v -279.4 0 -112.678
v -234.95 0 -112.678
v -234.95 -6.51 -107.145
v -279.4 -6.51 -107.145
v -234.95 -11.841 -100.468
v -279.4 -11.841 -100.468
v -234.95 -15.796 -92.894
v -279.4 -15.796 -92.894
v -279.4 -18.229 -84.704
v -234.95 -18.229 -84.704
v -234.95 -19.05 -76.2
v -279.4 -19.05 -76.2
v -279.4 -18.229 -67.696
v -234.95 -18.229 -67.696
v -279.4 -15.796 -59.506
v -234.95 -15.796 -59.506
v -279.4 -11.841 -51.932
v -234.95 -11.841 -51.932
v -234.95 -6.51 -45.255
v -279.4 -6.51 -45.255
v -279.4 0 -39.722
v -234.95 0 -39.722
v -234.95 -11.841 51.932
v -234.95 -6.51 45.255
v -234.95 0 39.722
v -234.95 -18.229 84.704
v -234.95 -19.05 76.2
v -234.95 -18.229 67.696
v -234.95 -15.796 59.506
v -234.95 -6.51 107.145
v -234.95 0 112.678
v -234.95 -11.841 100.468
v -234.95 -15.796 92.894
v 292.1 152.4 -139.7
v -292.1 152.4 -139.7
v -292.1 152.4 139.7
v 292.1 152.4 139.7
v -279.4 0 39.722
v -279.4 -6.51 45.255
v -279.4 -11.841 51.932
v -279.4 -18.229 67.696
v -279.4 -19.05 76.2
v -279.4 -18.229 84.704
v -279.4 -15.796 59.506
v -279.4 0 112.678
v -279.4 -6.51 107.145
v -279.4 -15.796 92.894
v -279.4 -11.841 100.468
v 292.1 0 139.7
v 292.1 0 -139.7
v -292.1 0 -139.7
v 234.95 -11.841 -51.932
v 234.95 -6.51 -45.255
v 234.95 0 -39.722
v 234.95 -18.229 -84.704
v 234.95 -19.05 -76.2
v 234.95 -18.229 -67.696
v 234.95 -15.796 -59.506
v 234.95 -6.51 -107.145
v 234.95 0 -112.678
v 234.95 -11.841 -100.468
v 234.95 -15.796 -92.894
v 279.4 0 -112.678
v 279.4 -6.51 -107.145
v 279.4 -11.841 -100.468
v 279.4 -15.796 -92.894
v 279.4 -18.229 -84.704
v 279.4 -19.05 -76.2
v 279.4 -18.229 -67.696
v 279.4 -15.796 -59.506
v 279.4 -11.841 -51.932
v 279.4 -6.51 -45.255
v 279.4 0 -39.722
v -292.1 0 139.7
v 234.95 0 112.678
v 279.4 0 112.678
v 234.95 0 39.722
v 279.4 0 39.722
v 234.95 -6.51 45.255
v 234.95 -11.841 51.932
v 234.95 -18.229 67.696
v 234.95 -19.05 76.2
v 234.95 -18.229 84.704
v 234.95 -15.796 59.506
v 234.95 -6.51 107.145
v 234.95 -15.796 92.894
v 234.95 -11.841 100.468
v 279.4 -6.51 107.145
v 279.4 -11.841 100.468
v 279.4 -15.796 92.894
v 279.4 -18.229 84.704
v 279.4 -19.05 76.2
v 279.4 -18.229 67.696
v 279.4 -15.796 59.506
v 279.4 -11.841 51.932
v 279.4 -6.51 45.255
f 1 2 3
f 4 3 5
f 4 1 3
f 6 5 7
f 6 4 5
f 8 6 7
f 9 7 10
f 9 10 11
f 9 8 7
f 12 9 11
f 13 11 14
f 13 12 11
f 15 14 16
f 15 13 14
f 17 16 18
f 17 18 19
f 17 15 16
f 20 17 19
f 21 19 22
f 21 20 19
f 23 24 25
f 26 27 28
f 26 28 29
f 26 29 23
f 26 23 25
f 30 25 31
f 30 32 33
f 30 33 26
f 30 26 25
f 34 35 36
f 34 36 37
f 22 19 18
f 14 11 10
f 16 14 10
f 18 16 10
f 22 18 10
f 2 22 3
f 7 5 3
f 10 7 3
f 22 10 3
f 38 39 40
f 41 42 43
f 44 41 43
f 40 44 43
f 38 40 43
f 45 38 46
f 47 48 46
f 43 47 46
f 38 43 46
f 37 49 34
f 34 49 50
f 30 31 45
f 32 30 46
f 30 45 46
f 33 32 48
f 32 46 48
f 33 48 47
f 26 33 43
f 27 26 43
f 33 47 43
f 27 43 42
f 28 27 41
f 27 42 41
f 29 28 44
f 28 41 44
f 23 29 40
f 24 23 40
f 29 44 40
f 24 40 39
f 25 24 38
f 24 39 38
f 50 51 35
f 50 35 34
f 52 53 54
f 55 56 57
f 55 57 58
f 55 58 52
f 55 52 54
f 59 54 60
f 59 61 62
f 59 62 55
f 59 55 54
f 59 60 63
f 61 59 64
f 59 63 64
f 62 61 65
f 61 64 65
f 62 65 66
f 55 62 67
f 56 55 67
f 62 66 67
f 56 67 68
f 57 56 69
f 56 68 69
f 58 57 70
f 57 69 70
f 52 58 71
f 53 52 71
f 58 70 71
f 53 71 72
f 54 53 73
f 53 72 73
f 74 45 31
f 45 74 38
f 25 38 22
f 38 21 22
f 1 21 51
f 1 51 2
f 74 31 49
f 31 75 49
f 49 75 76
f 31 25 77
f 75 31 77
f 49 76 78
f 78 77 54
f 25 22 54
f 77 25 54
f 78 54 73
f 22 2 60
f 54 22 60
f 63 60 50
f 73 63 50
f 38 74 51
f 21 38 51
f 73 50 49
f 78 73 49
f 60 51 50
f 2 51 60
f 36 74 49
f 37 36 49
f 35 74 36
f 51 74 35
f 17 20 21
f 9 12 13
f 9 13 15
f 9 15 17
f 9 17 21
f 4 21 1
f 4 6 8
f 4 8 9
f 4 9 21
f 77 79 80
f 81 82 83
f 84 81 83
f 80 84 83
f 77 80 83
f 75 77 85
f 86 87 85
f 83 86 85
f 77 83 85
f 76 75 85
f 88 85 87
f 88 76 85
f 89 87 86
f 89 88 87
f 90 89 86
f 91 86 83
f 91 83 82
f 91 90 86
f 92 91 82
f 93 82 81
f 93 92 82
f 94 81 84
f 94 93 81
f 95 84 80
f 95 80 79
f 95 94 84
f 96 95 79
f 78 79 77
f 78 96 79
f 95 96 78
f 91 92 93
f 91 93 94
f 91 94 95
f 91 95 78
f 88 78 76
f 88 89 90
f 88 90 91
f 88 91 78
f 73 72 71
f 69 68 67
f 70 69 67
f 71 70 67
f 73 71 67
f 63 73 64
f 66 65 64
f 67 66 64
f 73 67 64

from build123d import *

# Parameters (mm, degrees)
CHASIS_W                = 584.2
CHASIS_H                = 279.4
BOSS_EXTRUDE1_DEPTH     = 152.4
SKETCH3_W               = 44.45
SKETCH3_H               = 44.45
MIRROR2_COPY_1_SKETCH_W = 44.45
MIRROR2_COPY_1_SKETCH_H = 44.45


with BuildPart() as part:
    # Chasis → Boss-Extrude1 (new body)
    with BuildSketch(Plane(origin=(0, 0, 0), x_dir=(1, 0, 0), z_dir=(0, 1, 0))):
        Rectangle(CHASIS_W, CHASIS_H)
    extrude(amount=BOSS_EXTRUDE1_DEPTH)

    # Sketch3 → Revolve1 (revolve)
    with BuildSketch(Plane(origin=(0, 25.4, 0), x_dir=(-1, 0, 0), z_dir=(0, -1, 0))):
        with Locations((257.175, -98.425)):
            Rectangle(SKETCH3_W, SKETCH3_H)
    revolve1 = revolve(axis=Axis((-279.4, 25.4, 76.2), (1, 0, 0)))

    # Mirror1: Revolve1 across plane
    add(revolve1.mirror(Plane.XY))

    # Mirror2: Revolve1 across plane
    add(revolve1.mirror(Plane(origin=(0, 0, 0), x_dir=(0, 0, 1), z_dir=(1, 0, 0))))

    # Mirror2 copy 1 sketch → Mirror2 copy 1 (revolve)
    with BuildSketch(Plane.XZ.offset(-25.4)):
        with Locations((257.175, -98.425)):
            Rectangle(MIRROR2_COPY_1_SKETCH_W, MIRROR2_COPY_1_SKETCH_H)
    revolve(axis=Axis((279.4, 25.4, -76.2), (-1, 0, 0)))


solid = part.part
